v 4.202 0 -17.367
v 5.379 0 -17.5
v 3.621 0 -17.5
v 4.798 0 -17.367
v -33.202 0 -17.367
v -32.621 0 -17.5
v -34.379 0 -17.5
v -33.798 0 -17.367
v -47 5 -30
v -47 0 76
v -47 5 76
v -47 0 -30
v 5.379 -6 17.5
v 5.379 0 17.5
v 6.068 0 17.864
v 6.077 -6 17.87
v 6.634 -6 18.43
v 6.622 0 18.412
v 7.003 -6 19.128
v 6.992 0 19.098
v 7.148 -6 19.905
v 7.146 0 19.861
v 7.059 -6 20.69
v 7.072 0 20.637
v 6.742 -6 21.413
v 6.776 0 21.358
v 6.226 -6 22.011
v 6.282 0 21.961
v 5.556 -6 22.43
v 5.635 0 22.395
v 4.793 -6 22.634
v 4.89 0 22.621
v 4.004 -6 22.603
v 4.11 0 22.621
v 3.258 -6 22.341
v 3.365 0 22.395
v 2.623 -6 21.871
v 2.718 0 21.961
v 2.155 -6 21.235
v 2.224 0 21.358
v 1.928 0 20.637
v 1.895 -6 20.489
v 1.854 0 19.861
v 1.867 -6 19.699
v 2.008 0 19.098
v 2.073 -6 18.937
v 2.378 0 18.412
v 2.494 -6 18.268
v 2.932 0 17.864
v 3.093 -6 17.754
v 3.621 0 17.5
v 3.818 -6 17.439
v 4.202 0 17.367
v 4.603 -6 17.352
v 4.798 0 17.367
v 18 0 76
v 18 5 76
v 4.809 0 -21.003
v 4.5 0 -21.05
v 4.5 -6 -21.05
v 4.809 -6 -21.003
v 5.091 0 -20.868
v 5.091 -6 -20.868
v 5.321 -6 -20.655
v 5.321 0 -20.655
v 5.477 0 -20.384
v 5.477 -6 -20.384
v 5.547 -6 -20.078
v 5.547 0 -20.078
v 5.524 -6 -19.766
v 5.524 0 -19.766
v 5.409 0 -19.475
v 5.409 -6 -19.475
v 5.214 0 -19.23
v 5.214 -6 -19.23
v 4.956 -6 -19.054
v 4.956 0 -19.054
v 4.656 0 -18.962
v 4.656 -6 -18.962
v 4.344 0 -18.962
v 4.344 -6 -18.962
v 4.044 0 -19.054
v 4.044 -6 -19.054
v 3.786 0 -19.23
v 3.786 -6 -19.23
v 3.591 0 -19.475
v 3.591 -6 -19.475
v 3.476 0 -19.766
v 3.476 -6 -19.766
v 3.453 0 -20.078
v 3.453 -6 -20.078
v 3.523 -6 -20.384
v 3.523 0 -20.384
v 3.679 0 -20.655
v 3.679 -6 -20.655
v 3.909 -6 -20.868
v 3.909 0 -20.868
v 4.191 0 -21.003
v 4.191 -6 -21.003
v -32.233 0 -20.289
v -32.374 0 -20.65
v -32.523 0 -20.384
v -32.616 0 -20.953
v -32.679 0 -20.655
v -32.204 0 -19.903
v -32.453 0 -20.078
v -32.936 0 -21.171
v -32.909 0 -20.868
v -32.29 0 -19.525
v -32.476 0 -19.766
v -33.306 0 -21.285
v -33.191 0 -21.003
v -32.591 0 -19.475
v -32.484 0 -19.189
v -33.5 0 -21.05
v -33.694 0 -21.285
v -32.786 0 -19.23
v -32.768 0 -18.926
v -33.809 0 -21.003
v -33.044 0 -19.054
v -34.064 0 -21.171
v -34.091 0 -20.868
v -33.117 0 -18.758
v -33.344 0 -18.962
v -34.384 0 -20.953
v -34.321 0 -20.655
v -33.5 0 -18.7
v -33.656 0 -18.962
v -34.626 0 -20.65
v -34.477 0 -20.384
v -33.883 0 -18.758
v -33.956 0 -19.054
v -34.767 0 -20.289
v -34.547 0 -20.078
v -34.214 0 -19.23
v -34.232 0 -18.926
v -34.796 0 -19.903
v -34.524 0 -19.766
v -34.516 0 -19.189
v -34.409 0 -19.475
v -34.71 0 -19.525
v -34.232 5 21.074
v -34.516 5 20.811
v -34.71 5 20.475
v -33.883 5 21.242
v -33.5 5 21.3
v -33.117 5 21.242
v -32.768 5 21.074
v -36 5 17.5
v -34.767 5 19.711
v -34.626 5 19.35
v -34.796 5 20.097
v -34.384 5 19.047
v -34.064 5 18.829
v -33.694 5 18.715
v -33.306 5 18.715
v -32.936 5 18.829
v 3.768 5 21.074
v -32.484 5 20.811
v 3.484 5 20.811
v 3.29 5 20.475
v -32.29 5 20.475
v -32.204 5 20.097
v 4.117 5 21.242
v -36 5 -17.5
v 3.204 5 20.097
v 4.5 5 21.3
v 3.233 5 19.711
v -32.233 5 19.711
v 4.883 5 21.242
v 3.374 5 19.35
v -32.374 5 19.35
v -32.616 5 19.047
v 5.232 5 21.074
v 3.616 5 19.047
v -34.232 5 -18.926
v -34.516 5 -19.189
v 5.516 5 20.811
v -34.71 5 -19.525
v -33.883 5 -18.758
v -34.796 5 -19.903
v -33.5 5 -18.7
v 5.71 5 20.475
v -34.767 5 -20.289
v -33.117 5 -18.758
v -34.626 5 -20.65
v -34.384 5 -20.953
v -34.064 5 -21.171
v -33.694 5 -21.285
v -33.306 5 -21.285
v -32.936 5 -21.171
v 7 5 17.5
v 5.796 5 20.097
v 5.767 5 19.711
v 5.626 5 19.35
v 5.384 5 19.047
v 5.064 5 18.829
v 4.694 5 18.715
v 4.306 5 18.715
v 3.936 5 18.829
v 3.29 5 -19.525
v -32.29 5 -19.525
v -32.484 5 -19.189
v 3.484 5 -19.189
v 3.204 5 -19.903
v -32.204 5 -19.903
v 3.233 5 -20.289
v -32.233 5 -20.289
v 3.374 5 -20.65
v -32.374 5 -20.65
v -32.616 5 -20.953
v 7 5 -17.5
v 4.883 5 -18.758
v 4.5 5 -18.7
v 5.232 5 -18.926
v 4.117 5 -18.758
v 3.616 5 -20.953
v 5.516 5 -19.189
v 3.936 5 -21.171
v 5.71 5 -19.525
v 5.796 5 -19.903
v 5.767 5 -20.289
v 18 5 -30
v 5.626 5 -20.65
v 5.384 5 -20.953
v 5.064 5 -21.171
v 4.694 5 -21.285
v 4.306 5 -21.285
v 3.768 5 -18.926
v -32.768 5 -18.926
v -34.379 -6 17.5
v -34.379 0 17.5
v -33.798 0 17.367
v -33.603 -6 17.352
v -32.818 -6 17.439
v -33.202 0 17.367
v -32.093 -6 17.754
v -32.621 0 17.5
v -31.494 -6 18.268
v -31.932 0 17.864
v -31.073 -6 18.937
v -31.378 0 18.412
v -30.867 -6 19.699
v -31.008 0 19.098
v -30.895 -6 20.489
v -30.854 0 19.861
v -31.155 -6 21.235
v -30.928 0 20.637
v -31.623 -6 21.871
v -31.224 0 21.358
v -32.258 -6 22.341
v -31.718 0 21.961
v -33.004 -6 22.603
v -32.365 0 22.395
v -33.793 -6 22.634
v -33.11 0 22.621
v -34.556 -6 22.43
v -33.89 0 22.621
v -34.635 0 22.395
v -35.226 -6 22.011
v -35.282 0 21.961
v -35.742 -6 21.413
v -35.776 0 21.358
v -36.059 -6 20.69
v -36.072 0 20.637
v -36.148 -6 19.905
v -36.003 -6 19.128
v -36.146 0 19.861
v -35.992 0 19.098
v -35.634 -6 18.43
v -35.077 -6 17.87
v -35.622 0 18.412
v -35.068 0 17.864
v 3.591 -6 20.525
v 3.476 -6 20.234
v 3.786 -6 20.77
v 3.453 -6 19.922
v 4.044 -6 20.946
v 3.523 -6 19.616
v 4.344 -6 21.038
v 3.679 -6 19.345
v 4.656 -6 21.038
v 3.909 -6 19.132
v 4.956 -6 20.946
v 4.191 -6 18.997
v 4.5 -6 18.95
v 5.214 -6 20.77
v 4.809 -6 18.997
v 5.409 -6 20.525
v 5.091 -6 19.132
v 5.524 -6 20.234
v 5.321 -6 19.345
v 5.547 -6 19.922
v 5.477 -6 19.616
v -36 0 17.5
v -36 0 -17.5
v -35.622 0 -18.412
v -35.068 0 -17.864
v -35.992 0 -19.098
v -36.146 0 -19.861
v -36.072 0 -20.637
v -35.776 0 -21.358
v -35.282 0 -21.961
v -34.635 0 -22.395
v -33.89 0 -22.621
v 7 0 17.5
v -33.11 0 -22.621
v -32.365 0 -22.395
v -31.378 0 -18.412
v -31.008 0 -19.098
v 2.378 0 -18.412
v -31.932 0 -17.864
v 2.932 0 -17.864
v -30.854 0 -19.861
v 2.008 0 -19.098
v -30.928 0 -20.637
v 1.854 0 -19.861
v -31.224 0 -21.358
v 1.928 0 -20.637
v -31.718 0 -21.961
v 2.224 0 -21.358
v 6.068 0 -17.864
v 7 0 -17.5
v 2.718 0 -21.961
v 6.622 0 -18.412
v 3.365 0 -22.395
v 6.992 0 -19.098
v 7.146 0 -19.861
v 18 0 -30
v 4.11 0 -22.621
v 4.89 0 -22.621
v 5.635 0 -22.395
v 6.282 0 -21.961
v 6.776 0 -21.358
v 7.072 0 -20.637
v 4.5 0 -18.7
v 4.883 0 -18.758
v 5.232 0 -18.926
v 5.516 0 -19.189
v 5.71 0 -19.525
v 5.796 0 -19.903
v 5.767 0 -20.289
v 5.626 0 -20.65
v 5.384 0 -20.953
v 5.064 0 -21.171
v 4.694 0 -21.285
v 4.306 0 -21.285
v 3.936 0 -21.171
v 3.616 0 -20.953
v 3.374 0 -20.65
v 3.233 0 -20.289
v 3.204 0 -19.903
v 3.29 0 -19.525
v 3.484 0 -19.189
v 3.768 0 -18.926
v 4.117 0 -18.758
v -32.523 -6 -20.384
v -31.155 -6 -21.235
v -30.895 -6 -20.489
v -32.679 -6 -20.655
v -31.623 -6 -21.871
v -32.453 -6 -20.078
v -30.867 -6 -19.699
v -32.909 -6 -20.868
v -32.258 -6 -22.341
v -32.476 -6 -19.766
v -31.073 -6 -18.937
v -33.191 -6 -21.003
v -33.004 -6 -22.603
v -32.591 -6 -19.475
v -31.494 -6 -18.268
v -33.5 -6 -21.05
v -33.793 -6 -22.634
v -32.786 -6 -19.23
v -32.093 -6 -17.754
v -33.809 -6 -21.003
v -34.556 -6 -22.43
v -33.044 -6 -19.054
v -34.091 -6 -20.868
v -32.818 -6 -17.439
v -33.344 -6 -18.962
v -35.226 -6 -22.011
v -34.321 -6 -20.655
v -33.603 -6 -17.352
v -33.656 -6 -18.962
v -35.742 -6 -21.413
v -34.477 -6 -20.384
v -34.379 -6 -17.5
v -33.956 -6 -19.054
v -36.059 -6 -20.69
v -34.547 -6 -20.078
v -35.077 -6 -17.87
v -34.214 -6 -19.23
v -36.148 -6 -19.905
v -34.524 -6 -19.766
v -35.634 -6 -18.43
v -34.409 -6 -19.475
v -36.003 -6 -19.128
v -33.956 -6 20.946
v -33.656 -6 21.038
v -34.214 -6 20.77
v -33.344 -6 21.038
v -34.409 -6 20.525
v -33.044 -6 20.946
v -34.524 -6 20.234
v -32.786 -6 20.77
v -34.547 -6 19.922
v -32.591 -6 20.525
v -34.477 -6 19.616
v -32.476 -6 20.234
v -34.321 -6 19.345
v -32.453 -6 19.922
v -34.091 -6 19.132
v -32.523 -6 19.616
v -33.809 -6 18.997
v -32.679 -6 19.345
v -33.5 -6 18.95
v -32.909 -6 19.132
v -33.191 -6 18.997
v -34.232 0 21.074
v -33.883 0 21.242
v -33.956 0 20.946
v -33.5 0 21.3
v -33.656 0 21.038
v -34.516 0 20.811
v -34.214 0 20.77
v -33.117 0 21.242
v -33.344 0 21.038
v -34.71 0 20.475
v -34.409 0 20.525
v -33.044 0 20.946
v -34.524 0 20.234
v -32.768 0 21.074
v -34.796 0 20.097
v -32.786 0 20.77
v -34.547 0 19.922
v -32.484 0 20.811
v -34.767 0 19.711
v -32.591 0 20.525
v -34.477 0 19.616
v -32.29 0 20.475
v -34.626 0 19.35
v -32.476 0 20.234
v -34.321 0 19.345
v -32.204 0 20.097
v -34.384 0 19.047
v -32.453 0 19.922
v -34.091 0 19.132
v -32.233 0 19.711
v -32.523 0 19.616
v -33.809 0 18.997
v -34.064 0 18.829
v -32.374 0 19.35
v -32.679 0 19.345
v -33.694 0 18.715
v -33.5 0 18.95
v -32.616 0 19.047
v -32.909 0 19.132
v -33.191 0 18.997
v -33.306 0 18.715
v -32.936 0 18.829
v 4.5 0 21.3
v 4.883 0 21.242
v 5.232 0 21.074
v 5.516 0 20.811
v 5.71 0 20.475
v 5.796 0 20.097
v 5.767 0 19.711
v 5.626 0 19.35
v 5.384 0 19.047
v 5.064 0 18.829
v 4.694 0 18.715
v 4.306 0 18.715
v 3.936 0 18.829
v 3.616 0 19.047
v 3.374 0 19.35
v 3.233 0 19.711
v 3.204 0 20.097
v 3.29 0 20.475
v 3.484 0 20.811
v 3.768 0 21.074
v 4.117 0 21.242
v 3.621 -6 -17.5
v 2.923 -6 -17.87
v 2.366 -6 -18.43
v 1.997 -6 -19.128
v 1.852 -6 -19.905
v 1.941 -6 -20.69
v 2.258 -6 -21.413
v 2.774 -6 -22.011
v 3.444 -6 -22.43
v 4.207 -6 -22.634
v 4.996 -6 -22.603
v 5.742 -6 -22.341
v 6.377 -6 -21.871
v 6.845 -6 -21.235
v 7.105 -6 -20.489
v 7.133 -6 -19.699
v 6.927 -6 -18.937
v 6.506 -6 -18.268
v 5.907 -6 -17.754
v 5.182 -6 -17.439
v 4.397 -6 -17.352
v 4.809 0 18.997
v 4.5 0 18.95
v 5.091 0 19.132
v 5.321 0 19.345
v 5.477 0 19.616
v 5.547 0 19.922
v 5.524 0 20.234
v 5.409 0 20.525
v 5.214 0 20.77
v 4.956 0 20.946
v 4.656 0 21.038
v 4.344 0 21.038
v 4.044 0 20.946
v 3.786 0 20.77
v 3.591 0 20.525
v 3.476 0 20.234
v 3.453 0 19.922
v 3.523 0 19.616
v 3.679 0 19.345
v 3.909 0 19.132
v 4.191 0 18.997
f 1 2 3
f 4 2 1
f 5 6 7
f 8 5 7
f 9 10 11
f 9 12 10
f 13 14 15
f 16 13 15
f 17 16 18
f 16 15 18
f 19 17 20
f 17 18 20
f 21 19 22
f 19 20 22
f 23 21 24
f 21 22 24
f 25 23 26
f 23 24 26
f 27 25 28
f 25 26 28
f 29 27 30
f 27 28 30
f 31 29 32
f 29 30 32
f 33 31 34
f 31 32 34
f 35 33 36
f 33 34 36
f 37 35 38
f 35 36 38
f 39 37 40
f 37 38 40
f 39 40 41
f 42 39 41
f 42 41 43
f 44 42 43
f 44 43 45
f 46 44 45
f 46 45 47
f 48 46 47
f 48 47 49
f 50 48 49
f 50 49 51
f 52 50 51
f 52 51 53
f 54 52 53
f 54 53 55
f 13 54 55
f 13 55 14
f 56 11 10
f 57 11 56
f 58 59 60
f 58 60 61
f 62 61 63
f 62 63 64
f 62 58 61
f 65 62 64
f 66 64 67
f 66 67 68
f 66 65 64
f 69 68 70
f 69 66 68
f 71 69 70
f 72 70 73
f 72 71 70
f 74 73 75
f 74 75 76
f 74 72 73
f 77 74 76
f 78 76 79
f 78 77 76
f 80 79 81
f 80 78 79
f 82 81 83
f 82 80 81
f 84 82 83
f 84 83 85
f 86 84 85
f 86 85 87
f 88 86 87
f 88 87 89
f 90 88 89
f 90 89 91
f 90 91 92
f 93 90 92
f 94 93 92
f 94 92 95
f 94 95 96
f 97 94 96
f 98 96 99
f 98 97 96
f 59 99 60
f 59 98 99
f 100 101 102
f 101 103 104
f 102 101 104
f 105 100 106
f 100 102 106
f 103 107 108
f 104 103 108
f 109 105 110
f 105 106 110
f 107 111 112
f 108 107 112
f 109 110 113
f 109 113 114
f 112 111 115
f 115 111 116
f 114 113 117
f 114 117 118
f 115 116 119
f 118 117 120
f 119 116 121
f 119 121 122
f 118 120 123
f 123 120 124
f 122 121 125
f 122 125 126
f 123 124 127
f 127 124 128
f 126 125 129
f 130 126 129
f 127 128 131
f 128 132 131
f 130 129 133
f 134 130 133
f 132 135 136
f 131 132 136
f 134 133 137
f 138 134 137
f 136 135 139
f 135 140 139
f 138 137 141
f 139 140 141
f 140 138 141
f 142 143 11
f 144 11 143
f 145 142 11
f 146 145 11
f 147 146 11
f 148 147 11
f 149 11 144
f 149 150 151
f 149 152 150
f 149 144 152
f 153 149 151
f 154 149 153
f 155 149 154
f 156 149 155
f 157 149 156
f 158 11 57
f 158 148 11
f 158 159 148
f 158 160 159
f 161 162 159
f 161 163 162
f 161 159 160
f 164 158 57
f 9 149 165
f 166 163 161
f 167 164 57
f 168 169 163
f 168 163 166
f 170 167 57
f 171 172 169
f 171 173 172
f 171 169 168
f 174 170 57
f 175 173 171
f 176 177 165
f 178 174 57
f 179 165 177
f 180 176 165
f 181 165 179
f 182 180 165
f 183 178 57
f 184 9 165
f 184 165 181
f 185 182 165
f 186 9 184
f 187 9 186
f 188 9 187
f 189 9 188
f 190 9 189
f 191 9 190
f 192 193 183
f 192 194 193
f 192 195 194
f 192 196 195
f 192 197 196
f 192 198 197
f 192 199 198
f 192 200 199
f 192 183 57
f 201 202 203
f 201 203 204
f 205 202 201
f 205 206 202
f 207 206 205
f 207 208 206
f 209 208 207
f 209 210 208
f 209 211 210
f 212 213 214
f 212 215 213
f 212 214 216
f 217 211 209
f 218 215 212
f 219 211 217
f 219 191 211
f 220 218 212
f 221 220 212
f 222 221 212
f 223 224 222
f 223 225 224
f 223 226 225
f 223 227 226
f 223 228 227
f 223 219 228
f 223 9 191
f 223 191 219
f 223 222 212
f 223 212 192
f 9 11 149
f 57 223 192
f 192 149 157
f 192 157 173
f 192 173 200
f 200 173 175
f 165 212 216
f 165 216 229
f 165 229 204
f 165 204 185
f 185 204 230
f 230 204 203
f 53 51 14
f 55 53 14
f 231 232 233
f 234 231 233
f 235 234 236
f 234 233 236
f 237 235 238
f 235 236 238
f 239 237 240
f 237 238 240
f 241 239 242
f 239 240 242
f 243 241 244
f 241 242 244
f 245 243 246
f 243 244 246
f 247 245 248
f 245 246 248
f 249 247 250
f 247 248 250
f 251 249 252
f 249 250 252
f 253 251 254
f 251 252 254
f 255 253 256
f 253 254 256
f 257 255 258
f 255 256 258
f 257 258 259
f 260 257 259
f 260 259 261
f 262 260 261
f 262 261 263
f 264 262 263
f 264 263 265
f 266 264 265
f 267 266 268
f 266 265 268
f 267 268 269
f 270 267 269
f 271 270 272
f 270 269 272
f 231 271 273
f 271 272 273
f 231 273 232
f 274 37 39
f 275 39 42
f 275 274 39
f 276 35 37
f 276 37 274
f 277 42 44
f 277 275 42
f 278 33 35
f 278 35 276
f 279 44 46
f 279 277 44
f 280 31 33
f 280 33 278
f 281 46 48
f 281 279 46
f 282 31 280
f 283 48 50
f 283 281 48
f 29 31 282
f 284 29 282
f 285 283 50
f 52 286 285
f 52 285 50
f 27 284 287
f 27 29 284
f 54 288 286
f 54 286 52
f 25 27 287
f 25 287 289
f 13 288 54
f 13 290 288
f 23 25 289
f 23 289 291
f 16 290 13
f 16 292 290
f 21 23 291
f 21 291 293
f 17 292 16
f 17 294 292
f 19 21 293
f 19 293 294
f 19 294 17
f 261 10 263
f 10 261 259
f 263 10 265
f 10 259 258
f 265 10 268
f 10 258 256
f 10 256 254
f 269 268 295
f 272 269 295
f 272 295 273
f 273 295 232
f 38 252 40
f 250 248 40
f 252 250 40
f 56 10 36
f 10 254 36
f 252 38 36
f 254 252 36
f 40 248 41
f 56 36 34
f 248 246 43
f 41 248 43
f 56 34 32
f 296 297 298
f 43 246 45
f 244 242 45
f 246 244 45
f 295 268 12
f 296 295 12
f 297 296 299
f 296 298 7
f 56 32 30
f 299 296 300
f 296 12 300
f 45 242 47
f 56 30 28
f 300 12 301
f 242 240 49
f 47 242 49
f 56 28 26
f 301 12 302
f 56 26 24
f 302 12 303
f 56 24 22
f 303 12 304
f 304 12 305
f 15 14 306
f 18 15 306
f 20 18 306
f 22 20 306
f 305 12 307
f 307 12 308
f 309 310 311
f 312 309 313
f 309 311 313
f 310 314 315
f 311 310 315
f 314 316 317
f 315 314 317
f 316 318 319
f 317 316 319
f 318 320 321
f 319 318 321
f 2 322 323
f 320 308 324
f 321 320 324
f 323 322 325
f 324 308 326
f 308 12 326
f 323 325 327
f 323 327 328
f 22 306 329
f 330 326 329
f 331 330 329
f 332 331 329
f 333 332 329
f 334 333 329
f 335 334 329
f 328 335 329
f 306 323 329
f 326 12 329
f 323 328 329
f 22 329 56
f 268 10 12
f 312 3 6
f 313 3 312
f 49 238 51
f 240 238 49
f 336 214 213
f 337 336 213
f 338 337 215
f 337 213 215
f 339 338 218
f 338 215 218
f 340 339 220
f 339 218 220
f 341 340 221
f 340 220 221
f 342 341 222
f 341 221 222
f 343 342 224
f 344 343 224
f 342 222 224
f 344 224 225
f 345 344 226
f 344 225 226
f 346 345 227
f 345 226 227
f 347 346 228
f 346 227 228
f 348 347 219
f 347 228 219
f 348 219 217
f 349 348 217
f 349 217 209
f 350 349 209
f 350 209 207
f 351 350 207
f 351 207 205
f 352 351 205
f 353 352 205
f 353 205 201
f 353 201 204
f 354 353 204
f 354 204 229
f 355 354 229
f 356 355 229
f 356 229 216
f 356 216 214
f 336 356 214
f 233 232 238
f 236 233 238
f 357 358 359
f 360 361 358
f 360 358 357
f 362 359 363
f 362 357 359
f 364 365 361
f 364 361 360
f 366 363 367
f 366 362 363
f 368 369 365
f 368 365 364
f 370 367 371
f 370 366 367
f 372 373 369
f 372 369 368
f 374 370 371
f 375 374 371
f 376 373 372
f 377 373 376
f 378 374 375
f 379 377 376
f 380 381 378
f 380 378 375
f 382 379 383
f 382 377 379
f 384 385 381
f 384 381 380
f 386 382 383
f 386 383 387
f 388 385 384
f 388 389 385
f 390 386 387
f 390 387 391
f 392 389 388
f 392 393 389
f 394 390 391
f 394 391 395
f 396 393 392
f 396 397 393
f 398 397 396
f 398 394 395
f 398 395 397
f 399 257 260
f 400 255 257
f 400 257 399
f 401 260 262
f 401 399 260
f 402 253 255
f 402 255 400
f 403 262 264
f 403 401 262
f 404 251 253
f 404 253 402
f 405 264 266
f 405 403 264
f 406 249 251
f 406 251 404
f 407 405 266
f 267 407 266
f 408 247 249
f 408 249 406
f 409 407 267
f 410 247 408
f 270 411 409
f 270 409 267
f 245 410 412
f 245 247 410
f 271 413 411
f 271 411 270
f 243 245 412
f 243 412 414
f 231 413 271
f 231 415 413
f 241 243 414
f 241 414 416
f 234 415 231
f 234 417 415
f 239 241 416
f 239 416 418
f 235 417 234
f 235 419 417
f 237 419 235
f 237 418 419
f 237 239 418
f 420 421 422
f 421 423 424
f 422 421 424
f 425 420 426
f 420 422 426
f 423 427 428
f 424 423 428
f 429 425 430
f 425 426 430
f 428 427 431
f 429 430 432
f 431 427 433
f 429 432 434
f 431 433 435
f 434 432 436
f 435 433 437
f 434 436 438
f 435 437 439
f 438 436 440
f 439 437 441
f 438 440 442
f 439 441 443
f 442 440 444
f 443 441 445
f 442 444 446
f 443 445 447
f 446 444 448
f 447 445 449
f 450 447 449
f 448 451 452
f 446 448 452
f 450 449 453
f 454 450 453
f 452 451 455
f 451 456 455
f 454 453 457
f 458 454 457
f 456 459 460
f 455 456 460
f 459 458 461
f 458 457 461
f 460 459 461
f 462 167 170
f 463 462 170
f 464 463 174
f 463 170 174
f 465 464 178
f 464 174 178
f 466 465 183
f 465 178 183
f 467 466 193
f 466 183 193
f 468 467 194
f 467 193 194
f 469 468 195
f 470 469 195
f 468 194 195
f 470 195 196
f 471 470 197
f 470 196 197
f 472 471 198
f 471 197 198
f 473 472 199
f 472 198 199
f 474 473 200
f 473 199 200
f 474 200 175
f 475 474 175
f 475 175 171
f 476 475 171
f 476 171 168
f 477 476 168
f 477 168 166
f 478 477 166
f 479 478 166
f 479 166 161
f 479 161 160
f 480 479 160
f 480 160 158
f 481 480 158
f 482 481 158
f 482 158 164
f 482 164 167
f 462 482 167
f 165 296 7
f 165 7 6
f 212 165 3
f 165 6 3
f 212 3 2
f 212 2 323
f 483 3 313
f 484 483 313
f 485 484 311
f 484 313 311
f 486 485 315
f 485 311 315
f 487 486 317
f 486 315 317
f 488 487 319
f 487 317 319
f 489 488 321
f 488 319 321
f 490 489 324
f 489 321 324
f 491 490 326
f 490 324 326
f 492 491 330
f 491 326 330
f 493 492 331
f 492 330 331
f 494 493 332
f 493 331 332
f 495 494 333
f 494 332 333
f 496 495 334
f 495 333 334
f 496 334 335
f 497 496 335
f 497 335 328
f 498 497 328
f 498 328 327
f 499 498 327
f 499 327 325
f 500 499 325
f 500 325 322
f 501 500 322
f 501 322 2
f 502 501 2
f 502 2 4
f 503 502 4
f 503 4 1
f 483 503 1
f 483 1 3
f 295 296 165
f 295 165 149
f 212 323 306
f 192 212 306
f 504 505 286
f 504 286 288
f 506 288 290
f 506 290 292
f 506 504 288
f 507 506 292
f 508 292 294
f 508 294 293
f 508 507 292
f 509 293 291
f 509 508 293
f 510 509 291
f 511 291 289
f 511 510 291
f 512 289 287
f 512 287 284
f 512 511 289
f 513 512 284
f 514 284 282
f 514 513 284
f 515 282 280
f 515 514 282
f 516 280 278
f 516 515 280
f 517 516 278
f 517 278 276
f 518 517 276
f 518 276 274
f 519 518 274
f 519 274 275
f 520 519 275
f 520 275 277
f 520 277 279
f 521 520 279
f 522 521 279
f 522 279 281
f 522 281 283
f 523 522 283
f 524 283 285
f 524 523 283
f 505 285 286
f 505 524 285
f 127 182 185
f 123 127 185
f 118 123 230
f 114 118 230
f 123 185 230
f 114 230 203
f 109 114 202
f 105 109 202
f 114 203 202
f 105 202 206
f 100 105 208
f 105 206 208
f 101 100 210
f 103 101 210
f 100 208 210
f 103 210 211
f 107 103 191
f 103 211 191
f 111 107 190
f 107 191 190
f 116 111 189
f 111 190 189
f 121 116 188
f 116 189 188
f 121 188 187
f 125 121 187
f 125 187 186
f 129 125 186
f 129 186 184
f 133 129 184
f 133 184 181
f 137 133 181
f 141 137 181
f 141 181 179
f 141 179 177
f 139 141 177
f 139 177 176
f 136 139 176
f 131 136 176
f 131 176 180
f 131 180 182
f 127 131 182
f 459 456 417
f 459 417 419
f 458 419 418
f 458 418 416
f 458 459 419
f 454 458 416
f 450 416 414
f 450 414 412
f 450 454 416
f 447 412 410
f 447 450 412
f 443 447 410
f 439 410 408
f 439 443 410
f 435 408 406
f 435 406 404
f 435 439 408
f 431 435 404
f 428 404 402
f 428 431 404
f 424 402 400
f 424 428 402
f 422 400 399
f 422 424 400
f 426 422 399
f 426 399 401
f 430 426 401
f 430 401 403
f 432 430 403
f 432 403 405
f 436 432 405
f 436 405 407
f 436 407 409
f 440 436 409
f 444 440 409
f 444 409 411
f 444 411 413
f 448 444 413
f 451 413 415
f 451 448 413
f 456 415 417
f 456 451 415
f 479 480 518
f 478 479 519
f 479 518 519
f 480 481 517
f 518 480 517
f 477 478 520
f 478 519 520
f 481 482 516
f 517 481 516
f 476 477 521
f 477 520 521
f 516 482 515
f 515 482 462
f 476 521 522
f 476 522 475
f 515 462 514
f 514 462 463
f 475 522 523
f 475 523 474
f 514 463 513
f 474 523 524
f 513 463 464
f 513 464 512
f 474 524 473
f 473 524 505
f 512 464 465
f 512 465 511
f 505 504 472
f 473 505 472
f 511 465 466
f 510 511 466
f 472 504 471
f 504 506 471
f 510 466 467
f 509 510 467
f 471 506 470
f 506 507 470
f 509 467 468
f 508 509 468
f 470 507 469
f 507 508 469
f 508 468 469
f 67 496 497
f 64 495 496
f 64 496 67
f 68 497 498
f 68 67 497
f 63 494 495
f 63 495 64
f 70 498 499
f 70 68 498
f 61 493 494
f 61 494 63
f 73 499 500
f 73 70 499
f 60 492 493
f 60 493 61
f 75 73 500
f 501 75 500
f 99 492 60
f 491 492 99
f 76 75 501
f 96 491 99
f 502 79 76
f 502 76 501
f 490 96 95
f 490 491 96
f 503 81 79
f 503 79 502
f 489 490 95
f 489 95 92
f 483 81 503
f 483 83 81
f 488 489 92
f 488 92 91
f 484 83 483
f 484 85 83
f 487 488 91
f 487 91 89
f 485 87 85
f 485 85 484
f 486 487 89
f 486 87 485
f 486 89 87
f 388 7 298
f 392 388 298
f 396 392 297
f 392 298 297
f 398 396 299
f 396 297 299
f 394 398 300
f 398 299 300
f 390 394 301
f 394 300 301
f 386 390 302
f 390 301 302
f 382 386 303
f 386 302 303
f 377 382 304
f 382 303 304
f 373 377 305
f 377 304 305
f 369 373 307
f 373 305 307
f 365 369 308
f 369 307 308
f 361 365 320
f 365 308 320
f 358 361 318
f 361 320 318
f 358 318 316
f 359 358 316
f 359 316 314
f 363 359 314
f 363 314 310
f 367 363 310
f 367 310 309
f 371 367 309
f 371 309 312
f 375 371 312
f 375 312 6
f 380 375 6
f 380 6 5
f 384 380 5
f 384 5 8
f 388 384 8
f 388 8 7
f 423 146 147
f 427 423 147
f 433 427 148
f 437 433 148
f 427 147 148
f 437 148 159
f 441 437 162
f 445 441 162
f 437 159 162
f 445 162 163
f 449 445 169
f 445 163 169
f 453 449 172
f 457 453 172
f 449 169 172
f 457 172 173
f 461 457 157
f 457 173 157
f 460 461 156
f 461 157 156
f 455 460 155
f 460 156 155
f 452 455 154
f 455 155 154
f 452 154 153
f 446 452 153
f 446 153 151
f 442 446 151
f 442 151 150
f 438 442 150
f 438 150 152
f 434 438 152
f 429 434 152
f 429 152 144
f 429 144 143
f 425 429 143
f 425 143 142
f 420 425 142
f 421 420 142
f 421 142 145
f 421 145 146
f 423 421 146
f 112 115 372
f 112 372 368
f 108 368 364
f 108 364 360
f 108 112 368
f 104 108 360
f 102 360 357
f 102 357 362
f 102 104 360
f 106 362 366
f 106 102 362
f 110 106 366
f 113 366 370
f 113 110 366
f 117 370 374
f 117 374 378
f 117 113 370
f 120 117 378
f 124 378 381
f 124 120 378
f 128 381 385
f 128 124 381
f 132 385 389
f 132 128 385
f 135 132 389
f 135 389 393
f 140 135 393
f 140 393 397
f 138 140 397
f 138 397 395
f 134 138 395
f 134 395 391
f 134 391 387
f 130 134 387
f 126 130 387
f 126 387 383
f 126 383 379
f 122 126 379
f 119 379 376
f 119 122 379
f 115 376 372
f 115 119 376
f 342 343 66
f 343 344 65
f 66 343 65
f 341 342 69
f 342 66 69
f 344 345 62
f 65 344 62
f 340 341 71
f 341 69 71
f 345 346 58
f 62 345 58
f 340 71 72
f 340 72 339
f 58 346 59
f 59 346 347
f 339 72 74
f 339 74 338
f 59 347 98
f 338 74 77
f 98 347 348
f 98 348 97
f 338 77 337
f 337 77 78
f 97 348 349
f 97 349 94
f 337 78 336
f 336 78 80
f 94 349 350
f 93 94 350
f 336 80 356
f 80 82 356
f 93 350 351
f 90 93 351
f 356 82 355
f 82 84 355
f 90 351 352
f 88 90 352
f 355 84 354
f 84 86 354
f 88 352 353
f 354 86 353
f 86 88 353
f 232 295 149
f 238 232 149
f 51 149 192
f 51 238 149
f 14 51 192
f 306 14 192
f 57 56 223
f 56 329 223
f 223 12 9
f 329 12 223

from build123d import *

# Parameters (mm, degrees)
SKETCH3_W           = 65
SKETCH3_H           = 60
BOSS_EXTRUDE3_DEPTH = 5
SKETCH5_W           = 43
SKETCH5_H           = 35
CUT_EXTRUDE2_DEPTH  = 10
CUT_EXTRUDE1_REACH  = 57.982
SKETCH4_R           = 1.3
SKETCH9_R           = 2.65
SKETCH9_R_2         = 1.05
BOSS_EXTRUDE5_DEPTH = 6
SKETCH11_W          = 65
SKETCH11_H          = 5
BOSS_EXTRUDE7_DEPTH = 46


with BuildPart() as part:
    # Sketch3 → Boss-Extrude3 (new body)
    with BuildSketch(Plane(origin=(0, 0, 0), x_dir=(1, 0, 0), z_dir=(0, 1, 0))):
        with Locations((-14.5, 0)):
            Rectangle(SKETCH3_W, SKETCH3_H)
    extrude(amount=BOSS_EXTRUDE3_DEPTH)

    # Sketch5 → Cut-Extrude2 (cut)
    with BuildSketch(Plane.XZ):
        with Locations((-14.5, 0)):
            Rectangle(SKETCH5_W, SKETCH5_H)
    extrude(amount=-CUT_EXTRUDE2_DEPTH, mode=Mode.SUBTRACT)

    # Sketch4 → Cut-Extrude1 (cut, up to next)
    with BuildSketch(Plane(origin=(0, 5, 0), x_dir=(1, 0, 0), z_dir=(0, 1, 0)), mode=Mode.PRIVATE) as cut_extrude1_sk1:
        with Locations(Location((-33.5, 20, 0), (0, 0, 270))):
            Circle(SKETCH4_R)
    cut_extrude1_tool1 = extrude(cut_extrude1_sk1.sketch, amount=-CUT_EXTRUDE1_REACH, mode=Mode.PRIVATE) & part.part
    # Sketch4 → Cut-Extrude1 (cut, up to next)
    with BuildSketch(Plane(origin=(0, 5, 0), x_dir=(1, 0, 0), z_dir=(0, 1, 0)), mode=Mode.PRIVATE) as cut_extrude1_sk2:
        with Locations(Location((4.5, 20, 0), (0, 0, 270))):
            Circle(SKETCH4_R)
    cut_extrude1_tool2 = extrude(cut_extrude1_sk2.sketch, amount=-CUT_EXTRUDE1_REACH, mode=Mode.PRIVATE) & part.part
    # Sketch4 → Cut-Extrude1 (cut, up to next)
    with BuildSketch(Plane(origin=(0, 5, 0), x_dir=(1, 0, 0), z_dir=(0, 1, 0)), mode=Mode.PRIVATE) as cut_extrude1_sk3:
        with Locations(Location((4.5, -20, 0), (0, 0, 270))):
            Circle(SKETCH4_R)
    cut_extrude1_tool3 = extrude(cut_extrude1_sk3.sketch, amount=-CUT_EXTRUDE1_REACH, mode=Mode.PRIVATE) & part.part
    # Sketch4 → Cut-Extrude1 (cut, up to next)
    with BuildSketch(Plane(origin=(0, 5, 0), x_dir=(1, 0, 0), z_dir=(0, 1, 0)), mode=Mode.PRIVATE) as cut_extrude1_sk4:
        with Locations(Location((-33.5, -20, 0), (0, 0, 270))):
            Circle(SKETCH4_R)
    cut_extrude1_tool4 = extrude(cut_extrude1_sk4.sketch, amount=-CUT_EXTRUDE1_REACH, mode=Mode.PRIVATE) & part.part
    add(cut_extrude1_tool1.solids().sort_by_distance((-33.5, 5, -20))[0], mode=Mode.SUBTRACT)
    add(cut_extrude1_tool2.solids().sort_by_distance((4.5, 5, -20))[0], mode=Mode.SUBTRACT)
    add(cut_extrude1_tool3.solids().sort_by_distance((4.5, 5, 20))[0], mode=Mode.SUBTRACT)
    add(cut_extrude1_tool4.solids().sort_by_distance((-33.5, 5, 20))[0], mode=Mode.SUBTRACT)

    # Sketch9 → Boss-Extrude5 (add)
    # profile 1 of 4: a face of its own
    with BuildSketch(Plane.XZ):
        with Locations(Location((-33.5, 20, 0), (0, 0, 250.629961754))):
            Circle(SKETCH9_R)
        with Locations(Location((-33.5, 20, 0), (0, 0, 270))):
            Circle(SKETCH9_R_2, mode=Mode.SUBTRACT)
    # profile 2 of 4: a face of its own
    with BuildSketch(Plane.XZ):
        with Locations(Location((-33.5, -20, 0), (0, 0, 109.370038246))):
            Circle(SKETCH9_R)
        with Locations(Location((-33.5, -20, 0), (0, 0, 270))):
            Circle(SKETCH9_R_2, mode=Mode.SUBTRACT)
    # profile 3 of 4: a face of its own
    with BuildSketch(Plane.XZ):
        with Locations(Location((4.5, 20, 0), (0, 0, 289.370038246))):
            Circle(SKETCH9_R)
        with Locations(Location((4.5, 20, 0), (0, 0, 270))):
            Circle(SKETCH9_R_2, mode=Mode.SUBTRACT)
    # profile 4 of 4: a face of its own
    with BuildSketch(Plane.XZ):
        with Locations(Location((4.5, -20, 0), (0, 0, 109.370038246))):
            Circle(SKETCH9_R)
        with Locations(Location((4.5, -20, 0), (0, 0, 270))):
            Circle(SKETCH9_R_2, mode=Mode.SUBTRACT)
    extrude(amount=BOSS_EXTRUDE5_DEPTH)

    # Sketch11 → Boss-Extrude7 (add)
    with BuildSketch(Plane.XY.offset(30)):
        with Locations((-14.5, 2.5)):
            Rectangle(SKETCH11_W, SKETCH11_H)
    extrude(amount=BOSS_EXTRUDE7_DEPTH)


solid = part.part
